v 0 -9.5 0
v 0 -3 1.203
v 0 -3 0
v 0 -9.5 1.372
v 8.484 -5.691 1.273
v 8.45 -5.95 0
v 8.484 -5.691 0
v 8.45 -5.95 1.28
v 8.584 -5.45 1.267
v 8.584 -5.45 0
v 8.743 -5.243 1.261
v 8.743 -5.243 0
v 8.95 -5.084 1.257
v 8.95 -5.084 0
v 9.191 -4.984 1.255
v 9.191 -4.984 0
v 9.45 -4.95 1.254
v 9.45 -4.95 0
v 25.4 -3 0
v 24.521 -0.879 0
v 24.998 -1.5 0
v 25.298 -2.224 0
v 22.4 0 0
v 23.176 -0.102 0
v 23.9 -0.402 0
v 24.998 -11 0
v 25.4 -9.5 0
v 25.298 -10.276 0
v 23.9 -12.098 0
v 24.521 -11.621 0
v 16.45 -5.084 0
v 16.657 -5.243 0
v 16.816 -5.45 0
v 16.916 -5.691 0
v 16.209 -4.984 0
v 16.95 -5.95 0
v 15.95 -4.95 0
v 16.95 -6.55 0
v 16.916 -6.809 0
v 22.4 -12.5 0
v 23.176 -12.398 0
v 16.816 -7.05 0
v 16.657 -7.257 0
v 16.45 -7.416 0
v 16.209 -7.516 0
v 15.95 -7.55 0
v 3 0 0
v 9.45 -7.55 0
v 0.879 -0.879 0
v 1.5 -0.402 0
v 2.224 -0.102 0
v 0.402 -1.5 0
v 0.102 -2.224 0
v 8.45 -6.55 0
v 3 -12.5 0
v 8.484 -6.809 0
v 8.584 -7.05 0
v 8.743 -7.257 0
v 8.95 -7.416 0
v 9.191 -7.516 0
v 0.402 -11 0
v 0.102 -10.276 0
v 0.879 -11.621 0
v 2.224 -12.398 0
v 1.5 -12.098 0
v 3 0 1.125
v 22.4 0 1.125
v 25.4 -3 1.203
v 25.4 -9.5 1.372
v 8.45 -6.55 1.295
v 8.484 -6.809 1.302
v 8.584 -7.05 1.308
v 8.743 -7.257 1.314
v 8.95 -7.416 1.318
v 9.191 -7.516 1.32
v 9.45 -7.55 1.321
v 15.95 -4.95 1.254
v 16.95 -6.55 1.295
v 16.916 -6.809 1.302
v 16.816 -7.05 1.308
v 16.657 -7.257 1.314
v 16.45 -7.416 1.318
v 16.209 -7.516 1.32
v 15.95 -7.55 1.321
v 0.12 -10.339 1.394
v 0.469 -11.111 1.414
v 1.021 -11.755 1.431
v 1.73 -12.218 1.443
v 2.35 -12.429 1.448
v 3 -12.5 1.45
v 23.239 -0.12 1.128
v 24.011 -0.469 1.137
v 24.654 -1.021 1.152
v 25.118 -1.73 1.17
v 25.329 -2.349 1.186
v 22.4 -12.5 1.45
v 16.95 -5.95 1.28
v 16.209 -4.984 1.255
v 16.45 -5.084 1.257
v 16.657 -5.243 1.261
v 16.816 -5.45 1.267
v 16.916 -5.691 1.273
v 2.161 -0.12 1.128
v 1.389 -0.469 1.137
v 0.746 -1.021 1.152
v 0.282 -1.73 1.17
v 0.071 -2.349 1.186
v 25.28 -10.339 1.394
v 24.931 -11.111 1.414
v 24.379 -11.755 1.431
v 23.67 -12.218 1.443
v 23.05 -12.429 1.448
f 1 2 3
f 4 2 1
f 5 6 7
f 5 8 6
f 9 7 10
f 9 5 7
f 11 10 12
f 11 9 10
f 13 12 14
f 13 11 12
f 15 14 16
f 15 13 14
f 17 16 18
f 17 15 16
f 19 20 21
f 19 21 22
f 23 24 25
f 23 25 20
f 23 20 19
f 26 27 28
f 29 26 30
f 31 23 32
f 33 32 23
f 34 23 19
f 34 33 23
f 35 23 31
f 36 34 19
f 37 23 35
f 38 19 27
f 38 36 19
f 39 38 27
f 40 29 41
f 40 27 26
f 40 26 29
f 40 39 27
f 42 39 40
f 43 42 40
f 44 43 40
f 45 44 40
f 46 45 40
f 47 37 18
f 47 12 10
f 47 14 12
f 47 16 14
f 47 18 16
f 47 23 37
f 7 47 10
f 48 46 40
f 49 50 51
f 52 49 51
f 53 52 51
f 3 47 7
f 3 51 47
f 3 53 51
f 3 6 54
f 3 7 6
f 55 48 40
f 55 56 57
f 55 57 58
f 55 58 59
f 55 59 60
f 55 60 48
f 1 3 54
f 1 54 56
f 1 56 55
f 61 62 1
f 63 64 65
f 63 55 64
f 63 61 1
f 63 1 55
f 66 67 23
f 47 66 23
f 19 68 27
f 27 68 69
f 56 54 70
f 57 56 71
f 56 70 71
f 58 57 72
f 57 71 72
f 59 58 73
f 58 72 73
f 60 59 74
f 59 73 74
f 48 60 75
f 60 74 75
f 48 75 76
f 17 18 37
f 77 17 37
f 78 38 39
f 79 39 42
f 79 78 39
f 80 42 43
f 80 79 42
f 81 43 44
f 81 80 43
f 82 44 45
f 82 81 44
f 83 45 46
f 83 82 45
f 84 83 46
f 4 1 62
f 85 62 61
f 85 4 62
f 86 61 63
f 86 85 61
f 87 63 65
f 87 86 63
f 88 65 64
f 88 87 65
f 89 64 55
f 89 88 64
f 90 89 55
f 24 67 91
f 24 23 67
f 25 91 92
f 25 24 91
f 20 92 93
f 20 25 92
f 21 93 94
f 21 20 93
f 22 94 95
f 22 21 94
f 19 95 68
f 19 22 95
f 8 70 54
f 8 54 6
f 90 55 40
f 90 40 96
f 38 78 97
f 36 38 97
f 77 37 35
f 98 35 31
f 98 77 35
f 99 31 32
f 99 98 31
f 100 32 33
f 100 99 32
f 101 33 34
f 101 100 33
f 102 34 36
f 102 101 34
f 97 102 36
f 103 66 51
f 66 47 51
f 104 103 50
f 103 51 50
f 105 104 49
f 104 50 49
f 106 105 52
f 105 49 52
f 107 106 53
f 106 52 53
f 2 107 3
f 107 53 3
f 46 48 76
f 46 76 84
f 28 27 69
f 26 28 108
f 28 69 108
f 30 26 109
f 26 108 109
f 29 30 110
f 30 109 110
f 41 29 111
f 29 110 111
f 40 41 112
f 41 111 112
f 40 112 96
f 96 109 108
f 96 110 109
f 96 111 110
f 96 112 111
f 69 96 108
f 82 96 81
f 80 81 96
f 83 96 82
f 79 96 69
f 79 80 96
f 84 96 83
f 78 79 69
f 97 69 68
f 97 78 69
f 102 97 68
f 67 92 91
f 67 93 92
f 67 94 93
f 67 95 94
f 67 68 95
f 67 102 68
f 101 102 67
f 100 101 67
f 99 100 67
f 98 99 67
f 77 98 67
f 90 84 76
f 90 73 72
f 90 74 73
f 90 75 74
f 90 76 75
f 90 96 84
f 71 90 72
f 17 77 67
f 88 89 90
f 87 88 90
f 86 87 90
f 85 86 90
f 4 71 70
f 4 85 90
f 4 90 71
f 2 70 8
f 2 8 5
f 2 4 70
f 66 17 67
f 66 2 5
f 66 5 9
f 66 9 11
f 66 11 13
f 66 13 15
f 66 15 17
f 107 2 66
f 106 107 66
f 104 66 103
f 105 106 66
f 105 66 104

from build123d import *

# Parameters (mm, degrees)
PAD027_DEPTH    = 25.4
SKETCH051_W     = 2.6
SKETCH051_H     = 8.5
POCKET024_DEPTH = 2
FILLET022_R     = 3
FILLET023_R     = 1


with BuildPart() as part:
    # Sketch050 → Pad027 (new body)
    with BuildSketch(Plane.YZ):
        Polygon((0, 0), (-12.5, 0), (-12.5, 1.45), (0, 1.125), align=None)
    extrude(amount=PAD027_DEPTH)

    # Sketch051 (on Face1 of Pad027) → Pocket024 (cut)
    with BuildSketch(Plane.YX):
        with Locations((-6.25, 12.7)):
            Rectangle(SKETCH051_W, SKETCH051_H)
    extrude(amount=-POCKET024_DEPTH, mode=Mode.SUBTRACT)

    # Fillet022
    fillet022_edges = [part.edges().sort_by_distance(p)[0] for p in [
        (25.4, 0, 0.5625),
        (0, 0, 0.5625),
        (25.4, -12.5, 0.725),
        (0, -12.5, 0.725),
    ]]
    fillet(fillet022_edges, radius=FILLET022_R)

    # Fillet023
    fillet023_edges = [part.edges().sort_by_distance(p)[0] for p in [
        (16.95, -7.55, 0.66065),
        (8.45, -7.55, 0.66065),
        (8.45, -4.95, 0.62685),
        (16.95, -4.95, 0.62685),
    ]]
    fillet(fillet023_edges, radius=FILLET023_R)


solid = part.part
